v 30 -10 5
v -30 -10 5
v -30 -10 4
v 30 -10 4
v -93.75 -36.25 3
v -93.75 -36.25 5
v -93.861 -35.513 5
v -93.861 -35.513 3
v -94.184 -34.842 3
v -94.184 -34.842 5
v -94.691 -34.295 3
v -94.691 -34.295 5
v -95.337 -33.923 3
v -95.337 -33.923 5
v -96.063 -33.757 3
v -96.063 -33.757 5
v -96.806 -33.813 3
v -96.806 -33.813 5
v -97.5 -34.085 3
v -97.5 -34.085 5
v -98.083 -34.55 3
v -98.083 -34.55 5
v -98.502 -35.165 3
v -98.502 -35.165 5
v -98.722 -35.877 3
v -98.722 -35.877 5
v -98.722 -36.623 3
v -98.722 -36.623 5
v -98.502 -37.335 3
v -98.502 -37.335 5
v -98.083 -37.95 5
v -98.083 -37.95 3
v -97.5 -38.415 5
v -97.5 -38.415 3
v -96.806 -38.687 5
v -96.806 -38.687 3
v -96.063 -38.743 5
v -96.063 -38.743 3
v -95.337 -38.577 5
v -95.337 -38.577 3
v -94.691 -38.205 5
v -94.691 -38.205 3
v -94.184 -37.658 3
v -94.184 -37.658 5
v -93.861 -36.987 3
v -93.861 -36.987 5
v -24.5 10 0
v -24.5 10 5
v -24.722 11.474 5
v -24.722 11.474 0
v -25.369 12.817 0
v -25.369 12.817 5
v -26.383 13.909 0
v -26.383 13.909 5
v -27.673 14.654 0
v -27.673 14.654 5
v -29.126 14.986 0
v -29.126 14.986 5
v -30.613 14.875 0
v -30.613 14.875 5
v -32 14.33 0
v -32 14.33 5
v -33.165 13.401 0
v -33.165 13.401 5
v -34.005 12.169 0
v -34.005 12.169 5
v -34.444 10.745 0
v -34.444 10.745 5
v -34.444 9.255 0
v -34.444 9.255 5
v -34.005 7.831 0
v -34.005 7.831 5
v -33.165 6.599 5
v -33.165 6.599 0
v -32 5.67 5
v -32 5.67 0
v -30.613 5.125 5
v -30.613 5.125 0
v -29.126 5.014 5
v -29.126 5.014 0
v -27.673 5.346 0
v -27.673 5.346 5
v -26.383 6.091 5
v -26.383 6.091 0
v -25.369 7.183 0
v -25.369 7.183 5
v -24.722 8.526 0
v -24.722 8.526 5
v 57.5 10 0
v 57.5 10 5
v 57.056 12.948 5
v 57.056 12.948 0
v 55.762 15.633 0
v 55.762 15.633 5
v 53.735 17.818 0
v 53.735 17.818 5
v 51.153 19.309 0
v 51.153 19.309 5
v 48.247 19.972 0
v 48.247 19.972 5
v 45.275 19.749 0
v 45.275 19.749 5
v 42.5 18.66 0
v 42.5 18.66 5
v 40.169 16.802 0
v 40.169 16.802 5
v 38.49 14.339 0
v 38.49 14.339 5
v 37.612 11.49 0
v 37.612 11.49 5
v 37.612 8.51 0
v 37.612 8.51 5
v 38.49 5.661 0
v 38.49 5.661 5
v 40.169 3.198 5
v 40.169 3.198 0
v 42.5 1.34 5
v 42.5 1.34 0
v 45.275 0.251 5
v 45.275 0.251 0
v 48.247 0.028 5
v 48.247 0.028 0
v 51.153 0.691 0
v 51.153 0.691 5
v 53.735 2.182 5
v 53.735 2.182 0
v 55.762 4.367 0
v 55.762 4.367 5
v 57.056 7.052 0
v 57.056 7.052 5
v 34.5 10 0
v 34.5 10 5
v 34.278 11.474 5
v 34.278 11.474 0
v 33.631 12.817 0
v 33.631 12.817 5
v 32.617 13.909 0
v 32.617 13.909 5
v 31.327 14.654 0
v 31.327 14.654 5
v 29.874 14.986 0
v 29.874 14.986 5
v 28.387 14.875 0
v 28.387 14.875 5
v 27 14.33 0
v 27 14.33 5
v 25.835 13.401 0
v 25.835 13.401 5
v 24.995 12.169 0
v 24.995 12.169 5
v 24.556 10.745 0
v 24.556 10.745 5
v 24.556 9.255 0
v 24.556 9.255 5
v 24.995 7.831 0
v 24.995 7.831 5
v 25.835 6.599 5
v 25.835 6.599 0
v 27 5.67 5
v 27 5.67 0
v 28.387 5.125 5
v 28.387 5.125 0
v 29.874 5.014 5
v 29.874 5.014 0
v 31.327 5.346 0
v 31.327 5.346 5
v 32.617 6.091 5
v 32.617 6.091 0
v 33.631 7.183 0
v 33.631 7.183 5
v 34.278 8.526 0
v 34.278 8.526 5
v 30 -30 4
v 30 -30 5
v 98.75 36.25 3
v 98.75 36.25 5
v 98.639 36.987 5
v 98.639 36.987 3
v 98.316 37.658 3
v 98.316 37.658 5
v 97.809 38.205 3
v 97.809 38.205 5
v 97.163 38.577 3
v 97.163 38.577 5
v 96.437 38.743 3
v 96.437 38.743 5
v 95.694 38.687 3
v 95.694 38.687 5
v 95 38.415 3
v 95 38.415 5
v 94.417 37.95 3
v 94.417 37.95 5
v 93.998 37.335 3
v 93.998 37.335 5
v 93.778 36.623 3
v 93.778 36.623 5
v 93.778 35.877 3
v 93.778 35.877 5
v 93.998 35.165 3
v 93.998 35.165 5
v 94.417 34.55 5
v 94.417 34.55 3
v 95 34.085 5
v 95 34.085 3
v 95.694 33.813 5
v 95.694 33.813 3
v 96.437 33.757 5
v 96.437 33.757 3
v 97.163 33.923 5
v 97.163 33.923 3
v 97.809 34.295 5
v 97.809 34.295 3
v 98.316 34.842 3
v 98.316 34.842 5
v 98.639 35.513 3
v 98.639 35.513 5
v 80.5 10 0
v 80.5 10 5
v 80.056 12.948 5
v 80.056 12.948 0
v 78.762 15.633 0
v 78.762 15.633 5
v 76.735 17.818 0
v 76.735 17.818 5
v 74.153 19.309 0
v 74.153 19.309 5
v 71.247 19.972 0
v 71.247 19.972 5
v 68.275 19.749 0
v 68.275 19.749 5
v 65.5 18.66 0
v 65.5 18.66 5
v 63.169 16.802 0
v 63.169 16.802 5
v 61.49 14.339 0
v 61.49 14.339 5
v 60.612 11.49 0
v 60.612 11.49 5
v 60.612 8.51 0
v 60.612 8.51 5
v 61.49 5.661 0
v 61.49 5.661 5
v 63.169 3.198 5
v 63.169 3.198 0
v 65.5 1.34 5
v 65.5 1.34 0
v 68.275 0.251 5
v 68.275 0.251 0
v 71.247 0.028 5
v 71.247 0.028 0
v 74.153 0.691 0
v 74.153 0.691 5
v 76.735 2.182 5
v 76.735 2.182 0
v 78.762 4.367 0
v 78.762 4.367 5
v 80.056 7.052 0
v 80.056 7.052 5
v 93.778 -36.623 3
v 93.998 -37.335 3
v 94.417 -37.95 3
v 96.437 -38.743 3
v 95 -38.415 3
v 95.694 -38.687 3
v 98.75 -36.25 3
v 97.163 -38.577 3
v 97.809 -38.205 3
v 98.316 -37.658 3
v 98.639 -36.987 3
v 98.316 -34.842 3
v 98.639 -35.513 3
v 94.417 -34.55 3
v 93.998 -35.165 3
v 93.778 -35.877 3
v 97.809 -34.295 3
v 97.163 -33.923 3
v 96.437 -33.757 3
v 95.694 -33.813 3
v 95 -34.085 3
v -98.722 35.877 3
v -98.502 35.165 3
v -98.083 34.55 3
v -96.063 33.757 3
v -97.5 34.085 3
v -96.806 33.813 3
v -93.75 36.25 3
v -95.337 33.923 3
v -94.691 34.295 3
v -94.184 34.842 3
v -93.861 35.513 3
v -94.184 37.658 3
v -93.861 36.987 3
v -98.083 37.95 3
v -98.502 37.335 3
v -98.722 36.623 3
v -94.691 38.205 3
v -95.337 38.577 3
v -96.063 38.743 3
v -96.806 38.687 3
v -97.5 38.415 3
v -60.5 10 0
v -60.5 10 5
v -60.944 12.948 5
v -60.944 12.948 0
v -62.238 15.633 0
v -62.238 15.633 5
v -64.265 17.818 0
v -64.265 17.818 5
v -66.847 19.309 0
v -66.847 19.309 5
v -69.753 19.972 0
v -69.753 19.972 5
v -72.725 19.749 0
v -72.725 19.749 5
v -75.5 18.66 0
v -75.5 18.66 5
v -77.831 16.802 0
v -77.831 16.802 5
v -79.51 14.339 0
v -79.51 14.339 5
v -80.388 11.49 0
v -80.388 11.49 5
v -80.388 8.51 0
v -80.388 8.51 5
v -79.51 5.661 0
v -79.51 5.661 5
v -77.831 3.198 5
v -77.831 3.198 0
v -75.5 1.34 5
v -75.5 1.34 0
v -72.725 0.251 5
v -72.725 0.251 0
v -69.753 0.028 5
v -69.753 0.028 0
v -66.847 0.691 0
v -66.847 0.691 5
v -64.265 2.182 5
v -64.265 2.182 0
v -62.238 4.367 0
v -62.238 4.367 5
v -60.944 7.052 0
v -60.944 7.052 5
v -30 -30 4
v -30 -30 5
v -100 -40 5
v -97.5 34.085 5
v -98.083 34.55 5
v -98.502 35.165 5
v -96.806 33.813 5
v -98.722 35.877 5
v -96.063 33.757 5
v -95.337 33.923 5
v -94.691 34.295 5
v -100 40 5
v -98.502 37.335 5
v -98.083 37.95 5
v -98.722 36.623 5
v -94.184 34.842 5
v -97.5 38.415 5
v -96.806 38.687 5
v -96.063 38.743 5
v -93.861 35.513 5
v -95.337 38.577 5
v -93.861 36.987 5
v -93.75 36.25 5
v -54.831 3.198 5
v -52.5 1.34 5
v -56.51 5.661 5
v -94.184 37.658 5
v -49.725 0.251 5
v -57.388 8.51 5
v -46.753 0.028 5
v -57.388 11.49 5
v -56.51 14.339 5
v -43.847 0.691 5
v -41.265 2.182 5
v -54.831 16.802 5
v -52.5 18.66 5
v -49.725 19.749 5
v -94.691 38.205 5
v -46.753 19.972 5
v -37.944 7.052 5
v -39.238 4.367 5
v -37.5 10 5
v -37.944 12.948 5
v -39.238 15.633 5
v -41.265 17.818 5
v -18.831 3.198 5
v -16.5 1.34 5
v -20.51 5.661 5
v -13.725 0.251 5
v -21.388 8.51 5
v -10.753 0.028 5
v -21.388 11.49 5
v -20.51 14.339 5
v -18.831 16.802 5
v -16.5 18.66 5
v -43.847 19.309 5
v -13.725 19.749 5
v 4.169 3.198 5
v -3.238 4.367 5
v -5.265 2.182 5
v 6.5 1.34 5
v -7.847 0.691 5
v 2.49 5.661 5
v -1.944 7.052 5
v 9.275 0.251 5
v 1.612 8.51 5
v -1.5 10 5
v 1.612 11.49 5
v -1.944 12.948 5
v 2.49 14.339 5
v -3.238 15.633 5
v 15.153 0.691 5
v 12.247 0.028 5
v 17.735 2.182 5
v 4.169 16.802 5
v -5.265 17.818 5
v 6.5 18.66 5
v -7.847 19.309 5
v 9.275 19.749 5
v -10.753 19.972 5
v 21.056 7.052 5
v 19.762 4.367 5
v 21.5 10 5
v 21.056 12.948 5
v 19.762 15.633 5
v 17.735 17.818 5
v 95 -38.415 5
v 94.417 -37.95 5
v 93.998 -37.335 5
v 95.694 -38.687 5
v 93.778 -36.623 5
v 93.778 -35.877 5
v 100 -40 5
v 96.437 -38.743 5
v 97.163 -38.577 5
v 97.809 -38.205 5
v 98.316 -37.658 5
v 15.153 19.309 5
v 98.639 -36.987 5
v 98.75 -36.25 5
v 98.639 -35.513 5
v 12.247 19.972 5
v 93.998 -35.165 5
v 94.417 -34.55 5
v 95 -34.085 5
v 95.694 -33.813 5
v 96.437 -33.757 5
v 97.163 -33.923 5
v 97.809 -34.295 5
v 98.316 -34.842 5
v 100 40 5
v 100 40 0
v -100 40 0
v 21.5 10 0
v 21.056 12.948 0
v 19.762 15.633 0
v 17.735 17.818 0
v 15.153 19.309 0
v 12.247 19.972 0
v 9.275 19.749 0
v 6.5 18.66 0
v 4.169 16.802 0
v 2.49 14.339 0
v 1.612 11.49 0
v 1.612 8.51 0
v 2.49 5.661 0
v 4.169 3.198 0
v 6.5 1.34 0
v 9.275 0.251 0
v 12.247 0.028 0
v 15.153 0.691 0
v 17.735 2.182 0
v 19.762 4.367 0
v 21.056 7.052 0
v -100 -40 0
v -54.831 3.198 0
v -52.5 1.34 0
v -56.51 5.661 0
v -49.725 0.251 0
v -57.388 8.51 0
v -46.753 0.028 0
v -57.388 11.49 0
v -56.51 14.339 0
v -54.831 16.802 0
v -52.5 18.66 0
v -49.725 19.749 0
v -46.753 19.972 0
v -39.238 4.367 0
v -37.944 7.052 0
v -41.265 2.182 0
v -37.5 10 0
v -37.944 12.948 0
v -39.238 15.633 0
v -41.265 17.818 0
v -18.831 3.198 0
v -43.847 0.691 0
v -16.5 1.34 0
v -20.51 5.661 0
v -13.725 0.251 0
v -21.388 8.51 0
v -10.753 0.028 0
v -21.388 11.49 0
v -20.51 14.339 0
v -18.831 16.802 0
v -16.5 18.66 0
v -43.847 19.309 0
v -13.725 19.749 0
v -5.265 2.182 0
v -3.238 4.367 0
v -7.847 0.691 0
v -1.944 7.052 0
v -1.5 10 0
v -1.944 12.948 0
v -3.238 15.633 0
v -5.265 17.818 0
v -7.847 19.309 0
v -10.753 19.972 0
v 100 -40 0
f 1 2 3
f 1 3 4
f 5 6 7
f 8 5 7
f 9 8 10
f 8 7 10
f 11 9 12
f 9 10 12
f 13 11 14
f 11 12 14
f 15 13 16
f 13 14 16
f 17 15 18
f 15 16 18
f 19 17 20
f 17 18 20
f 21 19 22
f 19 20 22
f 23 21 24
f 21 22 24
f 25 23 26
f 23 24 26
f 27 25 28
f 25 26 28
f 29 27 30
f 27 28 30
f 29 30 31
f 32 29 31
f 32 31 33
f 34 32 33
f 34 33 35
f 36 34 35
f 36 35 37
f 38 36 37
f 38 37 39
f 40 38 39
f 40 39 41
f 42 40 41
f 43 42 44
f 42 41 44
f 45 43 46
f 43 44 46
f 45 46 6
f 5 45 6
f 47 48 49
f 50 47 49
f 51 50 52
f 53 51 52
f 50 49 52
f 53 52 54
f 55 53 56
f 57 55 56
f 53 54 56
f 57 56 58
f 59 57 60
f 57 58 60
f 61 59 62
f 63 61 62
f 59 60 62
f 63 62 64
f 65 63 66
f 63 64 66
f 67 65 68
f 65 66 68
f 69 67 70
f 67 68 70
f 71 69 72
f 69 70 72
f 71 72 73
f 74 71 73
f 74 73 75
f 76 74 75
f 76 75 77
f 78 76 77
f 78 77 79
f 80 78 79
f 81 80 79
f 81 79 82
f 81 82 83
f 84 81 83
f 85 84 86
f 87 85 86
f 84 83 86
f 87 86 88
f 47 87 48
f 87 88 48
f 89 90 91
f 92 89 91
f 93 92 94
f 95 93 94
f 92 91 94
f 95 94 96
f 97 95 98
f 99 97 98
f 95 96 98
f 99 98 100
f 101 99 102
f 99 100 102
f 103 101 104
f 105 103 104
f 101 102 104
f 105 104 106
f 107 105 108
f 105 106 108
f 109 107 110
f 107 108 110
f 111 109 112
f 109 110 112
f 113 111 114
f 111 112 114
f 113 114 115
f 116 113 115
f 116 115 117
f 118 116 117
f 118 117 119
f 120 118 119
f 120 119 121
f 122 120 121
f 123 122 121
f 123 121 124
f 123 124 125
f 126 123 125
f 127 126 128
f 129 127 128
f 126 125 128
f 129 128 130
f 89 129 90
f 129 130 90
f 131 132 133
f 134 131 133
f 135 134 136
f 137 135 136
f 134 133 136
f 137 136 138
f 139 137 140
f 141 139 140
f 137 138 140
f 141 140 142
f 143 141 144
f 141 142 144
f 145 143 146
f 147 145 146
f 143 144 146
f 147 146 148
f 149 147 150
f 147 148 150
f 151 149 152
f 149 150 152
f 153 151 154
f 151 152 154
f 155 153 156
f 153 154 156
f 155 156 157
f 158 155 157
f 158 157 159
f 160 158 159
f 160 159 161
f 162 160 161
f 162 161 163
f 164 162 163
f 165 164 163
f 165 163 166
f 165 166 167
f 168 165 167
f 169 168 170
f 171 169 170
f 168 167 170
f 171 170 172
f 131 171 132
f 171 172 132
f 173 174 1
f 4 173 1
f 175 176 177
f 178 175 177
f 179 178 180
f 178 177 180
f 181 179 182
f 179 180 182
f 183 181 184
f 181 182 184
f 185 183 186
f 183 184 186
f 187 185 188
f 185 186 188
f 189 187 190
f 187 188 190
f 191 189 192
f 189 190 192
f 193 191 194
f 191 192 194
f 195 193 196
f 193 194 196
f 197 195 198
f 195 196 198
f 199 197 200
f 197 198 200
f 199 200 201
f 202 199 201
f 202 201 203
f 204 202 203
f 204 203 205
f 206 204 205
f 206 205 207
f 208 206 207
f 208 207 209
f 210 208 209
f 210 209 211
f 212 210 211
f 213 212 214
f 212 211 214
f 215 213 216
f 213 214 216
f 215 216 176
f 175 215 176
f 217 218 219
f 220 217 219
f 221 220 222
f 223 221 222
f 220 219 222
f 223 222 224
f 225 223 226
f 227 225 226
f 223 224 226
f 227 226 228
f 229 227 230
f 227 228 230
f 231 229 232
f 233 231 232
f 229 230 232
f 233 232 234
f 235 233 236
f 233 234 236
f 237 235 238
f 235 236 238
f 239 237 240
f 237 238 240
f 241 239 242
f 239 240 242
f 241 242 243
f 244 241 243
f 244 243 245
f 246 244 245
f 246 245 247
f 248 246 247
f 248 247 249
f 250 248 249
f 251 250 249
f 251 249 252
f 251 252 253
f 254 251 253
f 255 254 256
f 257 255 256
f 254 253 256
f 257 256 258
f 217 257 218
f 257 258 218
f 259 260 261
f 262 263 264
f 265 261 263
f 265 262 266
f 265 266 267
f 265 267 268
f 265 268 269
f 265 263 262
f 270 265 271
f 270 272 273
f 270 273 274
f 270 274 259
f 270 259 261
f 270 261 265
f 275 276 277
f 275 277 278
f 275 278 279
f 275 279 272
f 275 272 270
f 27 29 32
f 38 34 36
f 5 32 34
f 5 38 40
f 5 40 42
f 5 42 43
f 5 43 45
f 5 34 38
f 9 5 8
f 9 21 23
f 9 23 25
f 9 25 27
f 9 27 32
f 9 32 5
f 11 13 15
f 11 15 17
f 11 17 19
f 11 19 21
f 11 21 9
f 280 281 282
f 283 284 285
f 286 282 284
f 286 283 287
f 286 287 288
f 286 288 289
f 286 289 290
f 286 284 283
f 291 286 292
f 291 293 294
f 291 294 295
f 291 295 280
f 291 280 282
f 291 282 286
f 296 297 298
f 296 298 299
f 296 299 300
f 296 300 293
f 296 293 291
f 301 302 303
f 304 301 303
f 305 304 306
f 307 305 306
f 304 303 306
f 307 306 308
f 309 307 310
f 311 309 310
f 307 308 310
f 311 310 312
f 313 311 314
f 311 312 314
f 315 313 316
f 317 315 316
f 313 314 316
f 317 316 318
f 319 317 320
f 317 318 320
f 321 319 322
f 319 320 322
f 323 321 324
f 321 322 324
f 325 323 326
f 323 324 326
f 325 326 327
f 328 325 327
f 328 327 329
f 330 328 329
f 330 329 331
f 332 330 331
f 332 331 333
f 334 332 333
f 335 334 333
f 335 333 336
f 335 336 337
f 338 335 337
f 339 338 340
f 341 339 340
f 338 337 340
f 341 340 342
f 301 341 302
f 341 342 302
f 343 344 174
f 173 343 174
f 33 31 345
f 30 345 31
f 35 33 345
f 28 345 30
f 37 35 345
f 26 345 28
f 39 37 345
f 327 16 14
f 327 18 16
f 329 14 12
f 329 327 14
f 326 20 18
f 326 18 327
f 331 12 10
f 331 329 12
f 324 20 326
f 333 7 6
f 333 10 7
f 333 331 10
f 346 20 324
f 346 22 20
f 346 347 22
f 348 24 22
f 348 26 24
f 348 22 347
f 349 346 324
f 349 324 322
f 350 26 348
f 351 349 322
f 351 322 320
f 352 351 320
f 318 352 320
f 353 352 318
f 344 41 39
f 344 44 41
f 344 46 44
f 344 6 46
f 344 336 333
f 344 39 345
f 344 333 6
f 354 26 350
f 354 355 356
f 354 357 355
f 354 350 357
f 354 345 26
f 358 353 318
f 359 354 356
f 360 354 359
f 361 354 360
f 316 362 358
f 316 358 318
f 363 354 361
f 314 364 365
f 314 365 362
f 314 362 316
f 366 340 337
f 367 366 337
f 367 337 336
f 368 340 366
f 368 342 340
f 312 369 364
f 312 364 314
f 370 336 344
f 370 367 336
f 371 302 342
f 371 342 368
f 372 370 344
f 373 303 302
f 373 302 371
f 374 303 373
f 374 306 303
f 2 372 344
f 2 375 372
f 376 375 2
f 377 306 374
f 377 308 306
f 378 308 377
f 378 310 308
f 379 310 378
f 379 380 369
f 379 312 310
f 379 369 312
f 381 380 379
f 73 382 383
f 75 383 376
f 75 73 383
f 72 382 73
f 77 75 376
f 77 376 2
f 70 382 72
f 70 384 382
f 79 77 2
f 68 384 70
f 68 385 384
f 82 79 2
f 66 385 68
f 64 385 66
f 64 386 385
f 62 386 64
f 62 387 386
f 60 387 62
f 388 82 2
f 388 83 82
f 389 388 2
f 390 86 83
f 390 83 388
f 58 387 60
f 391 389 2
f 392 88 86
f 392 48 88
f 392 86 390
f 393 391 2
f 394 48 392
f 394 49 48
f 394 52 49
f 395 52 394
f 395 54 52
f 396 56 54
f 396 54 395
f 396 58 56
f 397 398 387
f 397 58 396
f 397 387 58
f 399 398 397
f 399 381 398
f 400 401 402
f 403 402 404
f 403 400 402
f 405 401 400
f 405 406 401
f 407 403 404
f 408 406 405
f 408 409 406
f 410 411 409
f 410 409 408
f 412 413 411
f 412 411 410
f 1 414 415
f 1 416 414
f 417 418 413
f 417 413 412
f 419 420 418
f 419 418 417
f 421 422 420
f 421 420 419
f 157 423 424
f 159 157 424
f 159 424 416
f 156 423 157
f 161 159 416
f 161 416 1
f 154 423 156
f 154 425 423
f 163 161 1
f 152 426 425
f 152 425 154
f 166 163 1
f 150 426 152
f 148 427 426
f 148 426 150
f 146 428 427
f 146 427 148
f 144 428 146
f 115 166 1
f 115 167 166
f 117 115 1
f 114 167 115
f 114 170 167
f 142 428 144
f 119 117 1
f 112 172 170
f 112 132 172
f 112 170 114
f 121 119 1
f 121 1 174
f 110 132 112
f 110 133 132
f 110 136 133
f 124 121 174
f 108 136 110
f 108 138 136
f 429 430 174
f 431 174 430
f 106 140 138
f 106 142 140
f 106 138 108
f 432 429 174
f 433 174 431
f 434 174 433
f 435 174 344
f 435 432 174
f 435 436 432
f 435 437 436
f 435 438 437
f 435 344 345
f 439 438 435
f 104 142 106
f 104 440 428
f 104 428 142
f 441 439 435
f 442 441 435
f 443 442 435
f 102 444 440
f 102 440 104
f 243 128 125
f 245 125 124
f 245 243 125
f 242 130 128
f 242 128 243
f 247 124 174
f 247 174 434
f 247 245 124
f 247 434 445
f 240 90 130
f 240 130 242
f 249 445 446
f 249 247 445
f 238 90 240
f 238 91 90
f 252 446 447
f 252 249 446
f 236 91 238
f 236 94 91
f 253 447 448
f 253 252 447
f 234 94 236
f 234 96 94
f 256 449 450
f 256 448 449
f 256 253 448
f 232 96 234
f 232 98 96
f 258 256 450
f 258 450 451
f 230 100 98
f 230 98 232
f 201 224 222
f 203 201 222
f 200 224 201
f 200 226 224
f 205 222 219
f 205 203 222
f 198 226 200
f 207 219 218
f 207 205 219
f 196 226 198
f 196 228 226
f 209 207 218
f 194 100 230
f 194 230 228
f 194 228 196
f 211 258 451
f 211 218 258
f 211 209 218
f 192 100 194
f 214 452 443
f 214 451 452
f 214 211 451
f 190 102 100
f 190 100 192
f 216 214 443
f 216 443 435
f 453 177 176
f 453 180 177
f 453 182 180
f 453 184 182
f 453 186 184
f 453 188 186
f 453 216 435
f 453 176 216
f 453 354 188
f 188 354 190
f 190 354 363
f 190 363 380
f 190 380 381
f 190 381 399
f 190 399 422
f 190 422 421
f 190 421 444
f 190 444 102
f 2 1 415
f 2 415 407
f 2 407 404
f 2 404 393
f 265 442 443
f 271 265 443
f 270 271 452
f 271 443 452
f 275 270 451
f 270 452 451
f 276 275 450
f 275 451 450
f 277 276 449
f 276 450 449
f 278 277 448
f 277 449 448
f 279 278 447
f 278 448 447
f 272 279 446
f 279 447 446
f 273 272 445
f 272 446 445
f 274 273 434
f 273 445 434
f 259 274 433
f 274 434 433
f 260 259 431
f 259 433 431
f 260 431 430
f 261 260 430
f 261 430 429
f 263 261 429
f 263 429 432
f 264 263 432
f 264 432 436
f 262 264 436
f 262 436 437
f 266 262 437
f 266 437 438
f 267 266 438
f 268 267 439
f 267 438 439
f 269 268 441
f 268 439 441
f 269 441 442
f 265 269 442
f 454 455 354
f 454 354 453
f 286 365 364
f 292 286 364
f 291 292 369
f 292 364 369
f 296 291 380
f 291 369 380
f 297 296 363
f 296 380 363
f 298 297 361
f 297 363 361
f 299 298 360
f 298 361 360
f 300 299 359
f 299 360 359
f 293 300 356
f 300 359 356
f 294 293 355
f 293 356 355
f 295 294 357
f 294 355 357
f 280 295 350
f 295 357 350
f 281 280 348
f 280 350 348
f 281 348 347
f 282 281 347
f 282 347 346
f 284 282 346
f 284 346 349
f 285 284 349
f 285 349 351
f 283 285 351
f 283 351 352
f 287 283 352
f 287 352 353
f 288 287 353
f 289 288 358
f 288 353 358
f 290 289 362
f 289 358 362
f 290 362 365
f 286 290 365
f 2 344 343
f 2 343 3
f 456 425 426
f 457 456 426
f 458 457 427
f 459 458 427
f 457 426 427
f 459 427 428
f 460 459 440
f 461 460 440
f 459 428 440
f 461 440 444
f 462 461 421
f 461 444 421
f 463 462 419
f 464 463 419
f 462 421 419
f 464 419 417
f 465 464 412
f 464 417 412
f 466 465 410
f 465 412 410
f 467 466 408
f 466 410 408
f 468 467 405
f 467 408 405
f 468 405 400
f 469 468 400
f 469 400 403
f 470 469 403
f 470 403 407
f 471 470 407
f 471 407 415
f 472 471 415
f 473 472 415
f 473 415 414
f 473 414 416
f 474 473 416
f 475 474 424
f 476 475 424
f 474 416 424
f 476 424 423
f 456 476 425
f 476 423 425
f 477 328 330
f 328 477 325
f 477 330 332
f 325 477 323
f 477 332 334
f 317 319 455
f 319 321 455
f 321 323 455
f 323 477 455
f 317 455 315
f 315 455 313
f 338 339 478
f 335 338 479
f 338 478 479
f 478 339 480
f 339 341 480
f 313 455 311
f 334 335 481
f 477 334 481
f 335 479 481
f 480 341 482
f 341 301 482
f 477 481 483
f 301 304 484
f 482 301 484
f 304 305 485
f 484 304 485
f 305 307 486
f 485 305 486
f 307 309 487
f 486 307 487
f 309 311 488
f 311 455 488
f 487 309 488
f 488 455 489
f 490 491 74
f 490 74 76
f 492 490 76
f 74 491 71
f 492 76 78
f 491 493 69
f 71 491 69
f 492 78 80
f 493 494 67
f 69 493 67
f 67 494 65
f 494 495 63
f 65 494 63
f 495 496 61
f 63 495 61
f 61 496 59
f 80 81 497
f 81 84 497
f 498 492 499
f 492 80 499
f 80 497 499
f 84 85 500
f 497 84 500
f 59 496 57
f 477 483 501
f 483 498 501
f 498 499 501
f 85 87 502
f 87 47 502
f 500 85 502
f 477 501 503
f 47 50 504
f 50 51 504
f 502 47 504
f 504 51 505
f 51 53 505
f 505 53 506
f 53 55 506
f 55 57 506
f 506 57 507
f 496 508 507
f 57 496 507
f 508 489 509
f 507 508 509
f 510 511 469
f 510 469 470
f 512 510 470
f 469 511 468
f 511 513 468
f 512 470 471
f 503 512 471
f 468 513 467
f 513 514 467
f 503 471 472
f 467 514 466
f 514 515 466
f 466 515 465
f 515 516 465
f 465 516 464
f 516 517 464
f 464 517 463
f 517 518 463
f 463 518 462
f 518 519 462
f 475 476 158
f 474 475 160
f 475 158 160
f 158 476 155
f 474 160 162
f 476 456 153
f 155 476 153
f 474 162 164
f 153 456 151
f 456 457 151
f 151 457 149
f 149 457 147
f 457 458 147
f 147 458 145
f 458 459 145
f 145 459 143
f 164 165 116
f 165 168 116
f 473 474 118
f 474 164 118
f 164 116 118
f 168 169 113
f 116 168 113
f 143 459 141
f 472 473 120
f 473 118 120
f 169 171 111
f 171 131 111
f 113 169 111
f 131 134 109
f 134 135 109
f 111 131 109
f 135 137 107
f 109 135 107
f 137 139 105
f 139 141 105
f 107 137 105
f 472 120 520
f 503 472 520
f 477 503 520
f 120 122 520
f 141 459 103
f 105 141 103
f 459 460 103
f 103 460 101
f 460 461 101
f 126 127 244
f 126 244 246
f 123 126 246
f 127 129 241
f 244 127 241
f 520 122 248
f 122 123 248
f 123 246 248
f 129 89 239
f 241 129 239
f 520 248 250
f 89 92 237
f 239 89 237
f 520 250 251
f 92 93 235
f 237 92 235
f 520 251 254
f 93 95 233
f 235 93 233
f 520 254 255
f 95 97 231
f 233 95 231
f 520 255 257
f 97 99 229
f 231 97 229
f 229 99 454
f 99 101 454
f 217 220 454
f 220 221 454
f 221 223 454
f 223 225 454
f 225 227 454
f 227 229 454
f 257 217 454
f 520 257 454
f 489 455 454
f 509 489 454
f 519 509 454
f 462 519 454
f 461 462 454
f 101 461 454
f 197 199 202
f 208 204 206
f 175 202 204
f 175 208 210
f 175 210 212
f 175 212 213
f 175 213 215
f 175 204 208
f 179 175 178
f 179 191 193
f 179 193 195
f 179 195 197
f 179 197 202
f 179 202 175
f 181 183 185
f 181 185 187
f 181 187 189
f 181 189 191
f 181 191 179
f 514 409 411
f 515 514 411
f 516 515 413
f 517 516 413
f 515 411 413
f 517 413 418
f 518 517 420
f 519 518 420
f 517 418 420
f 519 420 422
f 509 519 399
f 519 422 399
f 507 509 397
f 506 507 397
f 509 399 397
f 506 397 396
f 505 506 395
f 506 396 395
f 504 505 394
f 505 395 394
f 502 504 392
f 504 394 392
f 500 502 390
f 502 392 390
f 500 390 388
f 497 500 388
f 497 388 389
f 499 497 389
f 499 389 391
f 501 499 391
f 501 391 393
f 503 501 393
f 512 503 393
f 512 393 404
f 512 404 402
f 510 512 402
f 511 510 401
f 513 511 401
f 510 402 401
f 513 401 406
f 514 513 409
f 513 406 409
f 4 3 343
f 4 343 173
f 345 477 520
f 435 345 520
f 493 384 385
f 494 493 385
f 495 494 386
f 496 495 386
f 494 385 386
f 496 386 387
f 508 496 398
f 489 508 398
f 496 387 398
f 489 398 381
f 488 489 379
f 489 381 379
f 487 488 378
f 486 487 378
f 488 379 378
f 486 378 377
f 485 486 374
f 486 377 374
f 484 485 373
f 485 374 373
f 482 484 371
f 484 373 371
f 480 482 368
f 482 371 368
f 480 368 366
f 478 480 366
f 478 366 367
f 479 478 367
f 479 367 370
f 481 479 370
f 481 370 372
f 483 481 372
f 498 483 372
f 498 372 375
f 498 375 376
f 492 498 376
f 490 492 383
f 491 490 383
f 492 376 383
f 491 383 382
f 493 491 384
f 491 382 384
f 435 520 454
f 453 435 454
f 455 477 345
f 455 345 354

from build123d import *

# Parameters (mm, degrees)
CROQUIS1_W              = 200
CROQUIS1_H              = 80
SALIENTE_EXTRUIR1_DEPTH = 5
CROQUIS2_R              = 2.5
CORTAR_EXTRUIR1_DEPTH   = 2
CROQUIS3_W              = 60
CROQUIS3_H              = 20
CORTAR_EXTRUIR2_DEPTH   = 1
CROQUIS4_R              = 10
CROQUIS4_R_2            = 5
CORTAR_EXTRUIR3_DEPTH   = 5


with BuildPart() as part:
    # Croquis1 → Saliente-Extruir1 (new body)
    with BuildSketch(Plane.XY):
        Rectangle(CROQUIS1_W, CROQUIS1_H)
    extrude(amount=SALIENTE_EXTRUIR1_DEPTH)

    # Croquis2 → Cortar-Extruir1 (cut)
    with BuildSketch(Plane.XY.offset(5)):
        with Locations((-96.25, 36.25)):
            Circle(CROQUIS2_R)
        with Locations((96.25, 36.25)):
            Circle(CROQUIS2_R)
        with Locations((96.25, -36.25)):
            Circle(CROQUIS2_R)
        with Locations((-96.25, -36.25)):
            Circle(CROQUIS2_R)
    extrude(amount=-CORTAR_EXTRUIR1_DEPTH, mode=Mode.SUBTRACT)

    # Croquis3 → Cortar-Extruir2 (cut)
    with BuildSketch(Plane.XY.offset(5)):
        with Locations((0, -20)):
            Rectangle(CROQUIS3_W, CROQUIS3_H)
    extrude(amount=-CORTAR_EXTRUIR2_DEPTH, mode=Mode.SUBTRACT)

    # Croquis4 → Cortar-Extruir3 (cut)
    with BuildSketch(Plane.XY.offset(5)):
        with Locations((-70.5, 10)):
            Circle(CROQUIS4_R)
        with Locations((-47.5, 10)):
            Circle(CROQUIS4_R)
        with Locations((-29.5, 10)):
            Circle(CROQUIS4_R_2)
        with Locations((-11.5, 10)):
            Circle(CROQUIS4_R)
        with Locations((11.5, 10)):
            Circle(CROQUIS4_R)
        with Locations((29.5, 10)):
            Circle(CROQUIS4_R_2)
        with Locations((47.5, 10)):
            Circle(CROQUIS4_R)
        with Locations((70.5, 10)):
            Circle(CROQUIS4_R)
    extrude(amount=-CORTAR_EXTRUIR3_DEPTH, mode=Mode.SUBTRACT)


solid = part.part
